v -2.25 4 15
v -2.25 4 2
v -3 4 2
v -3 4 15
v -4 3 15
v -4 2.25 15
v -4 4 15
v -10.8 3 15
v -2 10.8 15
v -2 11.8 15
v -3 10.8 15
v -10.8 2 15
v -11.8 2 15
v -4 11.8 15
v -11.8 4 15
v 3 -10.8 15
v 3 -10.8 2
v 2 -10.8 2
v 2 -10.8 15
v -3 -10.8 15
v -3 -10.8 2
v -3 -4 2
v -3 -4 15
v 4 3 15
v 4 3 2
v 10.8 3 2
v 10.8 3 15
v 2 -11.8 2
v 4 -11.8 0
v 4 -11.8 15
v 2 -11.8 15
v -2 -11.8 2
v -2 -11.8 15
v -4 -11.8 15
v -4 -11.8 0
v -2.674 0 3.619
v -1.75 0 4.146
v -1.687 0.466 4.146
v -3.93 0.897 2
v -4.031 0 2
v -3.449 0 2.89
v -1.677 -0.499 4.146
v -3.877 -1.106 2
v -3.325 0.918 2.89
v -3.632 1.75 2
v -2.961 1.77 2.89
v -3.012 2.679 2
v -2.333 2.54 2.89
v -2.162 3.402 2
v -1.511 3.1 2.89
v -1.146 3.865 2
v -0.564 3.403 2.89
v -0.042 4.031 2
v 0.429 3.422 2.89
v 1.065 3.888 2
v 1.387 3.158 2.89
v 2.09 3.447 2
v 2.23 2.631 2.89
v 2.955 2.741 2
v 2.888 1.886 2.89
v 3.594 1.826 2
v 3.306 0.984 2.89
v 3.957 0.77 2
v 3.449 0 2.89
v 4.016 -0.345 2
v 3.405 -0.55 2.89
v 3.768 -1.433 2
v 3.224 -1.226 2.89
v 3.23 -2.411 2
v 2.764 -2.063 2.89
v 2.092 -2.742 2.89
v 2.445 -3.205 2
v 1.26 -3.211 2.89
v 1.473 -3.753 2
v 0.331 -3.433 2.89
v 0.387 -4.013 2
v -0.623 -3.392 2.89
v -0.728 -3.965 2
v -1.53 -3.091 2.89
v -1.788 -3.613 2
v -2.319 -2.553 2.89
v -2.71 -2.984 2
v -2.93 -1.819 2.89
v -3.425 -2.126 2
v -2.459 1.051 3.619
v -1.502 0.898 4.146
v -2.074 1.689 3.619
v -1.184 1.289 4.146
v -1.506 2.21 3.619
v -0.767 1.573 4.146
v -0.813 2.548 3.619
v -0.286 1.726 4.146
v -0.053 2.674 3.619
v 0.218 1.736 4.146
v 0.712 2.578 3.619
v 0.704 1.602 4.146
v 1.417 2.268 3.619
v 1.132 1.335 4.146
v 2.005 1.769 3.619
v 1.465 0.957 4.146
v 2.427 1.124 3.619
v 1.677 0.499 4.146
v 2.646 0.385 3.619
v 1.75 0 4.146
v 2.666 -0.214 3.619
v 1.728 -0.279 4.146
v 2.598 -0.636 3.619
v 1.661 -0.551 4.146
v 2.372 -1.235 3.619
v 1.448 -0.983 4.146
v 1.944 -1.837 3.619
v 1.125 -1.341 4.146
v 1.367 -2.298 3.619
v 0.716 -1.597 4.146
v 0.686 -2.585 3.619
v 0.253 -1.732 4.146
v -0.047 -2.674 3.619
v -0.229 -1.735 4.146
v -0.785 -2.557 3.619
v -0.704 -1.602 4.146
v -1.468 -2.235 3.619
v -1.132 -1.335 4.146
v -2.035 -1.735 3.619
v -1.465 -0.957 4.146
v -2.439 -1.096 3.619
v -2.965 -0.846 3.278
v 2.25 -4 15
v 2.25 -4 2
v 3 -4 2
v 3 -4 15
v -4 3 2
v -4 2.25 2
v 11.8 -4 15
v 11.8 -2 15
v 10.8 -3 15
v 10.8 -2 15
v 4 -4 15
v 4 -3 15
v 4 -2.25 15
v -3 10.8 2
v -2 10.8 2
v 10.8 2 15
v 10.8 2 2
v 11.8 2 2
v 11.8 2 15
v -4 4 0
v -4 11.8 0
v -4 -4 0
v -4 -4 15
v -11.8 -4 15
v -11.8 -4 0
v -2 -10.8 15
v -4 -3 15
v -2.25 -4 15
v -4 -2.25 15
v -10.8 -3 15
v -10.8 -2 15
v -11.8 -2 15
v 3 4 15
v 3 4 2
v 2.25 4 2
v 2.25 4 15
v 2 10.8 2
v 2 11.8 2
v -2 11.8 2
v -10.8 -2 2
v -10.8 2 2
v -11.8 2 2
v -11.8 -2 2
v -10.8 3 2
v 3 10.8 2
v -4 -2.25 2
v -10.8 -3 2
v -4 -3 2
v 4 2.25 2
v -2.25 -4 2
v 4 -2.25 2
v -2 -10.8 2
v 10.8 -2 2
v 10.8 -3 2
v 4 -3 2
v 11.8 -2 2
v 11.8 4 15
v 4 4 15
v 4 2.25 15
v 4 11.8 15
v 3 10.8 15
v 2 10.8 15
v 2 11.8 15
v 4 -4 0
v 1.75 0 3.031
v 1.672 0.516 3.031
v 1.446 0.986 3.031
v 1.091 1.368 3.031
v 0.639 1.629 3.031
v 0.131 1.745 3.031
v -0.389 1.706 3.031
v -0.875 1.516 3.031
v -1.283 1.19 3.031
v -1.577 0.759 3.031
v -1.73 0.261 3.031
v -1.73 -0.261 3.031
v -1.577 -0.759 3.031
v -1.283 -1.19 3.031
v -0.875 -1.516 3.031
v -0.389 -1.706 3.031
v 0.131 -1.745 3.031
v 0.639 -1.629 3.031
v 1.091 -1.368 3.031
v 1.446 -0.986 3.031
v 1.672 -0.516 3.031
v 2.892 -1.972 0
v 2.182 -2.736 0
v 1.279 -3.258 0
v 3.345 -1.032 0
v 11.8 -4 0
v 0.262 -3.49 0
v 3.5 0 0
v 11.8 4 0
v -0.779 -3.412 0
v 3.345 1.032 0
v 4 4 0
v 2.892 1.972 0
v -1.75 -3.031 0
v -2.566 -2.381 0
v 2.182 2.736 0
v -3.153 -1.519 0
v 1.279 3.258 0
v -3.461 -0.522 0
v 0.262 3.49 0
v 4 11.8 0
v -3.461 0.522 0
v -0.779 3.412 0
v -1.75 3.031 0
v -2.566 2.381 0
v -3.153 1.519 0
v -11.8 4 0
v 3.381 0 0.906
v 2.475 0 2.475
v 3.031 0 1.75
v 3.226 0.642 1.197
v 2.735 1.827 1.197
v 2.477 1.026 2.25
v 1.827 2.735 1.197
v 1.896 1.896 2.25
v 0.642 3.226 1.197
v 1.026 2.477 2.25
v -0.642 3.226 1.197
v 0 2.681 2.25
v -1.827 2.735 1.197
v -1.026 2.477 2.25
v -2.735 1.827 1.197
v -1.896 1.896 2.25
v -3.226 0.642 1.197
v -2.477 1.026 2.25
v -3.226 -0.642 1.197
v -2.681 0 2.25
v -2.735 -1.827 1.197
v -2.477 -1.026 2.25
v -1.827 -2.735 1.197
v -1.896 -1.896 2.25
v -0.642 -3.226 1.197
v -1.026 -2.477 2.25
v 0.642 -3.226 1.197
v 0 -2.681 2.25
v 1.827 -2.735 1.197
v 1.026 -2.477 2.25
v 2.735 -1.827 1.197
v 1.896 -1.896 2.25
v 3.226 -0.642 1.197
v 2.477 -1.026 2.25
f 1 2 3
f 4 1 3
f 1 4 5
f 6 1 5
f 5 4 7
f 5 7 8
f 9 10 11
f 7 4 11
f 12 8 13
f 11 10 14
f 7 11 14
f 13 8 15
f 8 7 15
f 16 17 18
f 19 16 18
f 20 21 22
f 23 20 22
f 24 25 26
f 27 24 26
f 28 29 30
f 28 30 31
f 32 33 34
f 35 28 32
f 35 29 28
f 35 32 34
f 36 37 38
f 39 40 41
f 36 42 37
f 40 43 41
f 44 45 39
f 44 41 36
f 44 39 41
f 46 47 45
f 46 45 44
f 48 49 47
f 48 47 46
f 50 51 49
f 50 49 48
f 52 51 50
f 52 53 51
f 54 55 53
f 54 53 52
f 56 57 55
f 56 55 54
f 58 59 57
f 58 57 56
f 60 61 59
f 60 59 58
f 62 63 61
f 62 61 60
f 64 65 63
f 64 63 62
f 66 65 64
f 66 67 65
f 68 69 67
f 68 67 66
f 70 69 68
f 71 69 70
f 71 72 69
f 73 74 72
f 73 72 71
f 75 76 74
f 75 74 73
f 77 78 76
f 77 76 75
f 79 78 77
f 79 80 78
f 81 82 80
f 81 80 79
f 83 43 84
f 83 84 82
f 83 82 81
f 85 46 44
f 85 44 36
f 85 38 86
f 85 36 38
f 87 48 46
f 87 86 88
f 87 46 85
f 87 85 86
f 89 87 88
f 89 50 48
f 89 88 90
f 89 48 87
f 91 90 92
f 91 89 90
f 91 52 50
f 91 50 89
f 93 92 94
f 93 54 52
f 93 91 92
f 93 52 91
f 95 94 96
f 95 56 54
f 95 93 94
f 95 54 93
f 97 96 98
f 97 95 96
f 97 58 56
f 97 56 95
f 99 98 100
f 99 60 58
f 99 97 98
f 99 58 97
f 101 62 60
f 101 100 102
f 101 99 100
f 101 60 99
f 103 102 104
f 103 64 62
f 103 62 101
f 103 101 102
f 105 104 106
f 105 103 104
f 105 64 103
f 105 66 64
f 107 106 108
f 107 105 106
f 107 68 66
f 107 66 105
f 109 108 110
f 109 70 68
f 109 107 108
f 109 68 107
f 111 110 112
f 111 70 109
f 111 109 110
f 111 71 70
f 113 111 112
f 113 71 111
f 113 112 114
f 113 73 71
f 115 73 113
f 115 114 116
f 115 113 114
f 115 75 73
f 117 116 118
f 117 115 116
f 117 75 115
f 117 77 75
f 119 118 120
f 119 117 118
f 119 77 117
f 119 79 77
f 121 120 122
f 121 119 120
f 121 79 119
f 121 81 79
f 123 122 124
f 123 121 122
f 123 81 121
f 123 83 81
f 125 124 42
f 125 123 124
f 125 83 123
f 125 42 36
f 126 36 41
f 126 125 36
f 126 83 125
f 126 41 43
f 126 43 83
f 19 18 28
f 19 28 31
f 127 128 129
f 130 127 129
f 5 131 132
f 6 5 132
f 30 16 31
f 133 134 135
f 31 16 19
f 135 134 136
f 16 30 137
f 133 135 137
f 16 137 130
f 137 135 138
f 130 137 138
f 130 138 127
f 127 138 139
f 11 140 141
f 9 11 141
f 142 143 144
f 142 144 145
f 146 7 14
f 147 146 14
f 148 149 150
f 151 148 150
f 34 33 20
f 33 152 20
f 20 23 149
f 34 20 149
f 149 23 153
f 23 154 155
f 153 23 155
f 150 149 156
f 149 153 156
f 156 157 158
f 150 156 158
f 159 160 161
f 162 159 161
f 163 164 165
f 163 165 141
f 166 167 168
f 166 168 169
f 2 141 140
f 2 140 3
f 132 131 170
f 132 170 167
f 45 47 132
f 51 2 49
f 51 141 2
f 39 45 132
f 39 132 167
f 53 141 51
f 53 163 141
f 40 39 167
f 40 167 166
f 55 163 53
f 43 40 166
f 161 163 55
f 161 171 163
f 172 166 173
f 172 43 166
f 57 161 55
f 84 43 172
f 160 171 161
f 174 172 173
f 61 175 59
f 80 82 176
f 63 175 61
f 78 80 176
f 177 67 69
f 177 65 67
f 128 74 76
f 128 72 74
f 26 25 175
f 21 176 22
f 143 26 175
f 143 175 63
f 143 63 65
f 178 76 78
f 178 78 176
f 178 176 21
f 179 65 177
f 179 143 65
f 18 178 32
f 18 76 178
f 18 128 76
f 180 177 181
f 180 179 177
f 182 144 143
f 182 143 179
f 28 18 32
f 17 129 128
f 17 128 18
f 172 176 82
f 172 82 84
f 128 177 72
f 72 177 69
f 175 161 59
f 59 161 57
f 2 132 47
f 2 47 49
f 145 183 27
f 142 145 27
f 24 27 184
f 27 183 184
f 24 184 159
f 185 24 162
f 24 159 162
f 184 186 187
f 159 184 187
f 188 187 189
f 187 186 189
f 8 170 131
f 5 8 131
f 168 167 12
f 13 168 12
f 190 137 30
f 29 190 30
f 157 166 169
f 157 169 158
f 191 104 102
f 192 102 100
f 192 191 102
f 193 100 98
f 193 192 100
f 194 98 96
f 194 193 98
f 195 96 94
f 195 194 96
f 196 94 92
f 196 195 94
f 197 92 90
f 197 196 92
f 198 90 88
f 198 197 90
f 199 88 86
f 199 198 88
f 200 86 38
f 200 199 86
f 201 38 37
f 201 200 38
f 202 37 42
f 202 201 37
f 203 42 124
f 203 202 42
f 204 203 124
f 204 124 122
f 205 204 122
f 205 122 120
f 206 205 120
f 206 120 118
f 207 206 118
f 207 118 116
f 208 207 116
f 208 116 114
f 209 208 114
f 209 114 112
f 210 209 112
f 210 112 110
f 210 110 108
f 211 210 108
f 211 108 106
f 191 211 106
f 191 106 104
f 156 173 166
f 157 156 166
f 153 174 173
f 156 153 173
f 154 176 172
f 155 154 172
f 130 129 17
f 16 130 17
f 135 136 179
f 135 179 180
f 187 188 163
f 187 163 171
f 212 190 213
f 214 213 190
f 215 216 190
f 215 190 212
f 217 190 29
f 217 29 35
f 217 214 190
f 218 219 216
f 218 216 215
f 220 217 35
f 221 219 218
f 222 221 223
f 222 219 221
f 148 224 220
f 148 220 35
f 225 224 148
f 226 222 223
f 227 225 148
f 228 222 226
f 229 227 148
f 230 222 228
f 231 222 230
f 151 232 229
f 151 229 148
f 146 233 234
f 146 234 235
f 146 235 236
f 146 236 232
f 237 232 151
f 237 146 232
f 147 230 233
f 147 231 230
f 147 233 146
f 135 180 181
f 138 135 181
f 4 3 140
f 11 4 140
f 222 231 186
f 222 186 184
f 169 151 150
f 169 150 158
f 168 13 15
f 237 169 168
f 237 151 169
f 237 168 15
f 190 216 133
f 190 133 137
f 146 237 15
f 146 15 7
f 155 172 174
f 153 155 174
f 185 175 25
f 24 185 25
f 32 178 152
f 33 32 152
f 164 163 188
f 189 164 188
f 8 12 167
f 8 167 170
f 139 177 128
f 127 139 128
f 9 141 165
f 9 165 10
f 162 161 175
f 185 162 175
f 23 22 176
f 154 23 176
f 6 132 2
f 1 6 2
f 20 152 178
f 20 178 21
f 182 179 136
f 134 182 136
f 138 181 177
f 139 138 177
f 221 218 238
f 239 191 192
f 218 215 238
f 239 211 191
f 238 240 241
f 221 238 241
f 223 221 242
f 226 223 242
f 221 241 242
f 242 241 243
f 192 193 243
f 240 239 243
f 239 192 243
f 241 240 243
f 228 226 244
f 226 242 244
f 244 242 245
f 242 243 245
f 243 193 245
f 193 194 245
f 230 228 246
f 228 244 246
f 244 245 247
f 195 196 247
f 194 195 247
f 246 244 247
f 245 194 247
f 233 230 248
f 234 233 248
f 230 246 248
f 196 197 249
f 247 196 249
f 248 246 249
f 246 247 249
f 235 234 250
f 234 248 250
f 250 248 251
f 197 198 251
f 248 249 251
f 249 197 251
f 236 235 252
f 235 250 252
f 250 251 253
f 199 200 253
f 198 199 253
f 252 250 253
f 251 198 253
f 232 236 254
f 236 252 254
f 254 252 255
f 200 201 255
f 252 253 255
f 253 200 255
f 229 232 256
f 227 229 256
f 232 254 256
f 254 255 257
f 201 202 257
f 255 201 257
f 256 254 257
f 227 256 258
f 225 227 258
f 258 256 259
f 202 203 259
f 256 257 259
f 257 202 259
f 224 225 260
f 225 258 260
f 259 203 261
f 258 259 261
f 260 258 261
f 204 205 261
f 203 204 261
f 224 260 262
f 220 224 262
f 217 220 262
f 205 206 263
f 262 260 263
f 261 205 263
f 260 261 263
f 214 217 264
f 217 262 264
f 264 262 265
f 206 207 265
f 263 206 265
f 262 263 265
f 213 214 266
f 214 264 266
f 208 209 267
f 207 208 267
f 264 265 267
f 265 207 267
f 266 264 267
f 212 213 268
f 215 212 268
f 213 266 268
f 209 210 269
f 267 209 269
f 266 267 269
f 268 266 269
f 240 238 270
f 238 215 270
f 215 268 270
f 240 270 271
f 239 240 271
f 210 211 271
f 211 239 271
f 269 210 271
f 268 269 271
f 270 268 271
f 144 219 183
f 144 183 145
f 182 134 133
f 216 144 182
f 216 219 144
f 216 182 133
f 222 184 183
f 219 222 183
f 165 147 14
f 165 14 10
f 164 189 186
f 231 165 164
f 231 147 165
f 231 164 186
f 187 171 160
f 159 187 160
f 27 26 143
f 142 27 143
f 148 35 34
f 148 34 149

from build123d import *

# Parameters (mm, degrees)
PAD052_DEPTH          = 15
BOX006_W              = 4
BOX006_H              = 15
BOX006_DEPTH          = 12
POLARPATTERN021_COUNT = 4
PAD053_DEPTH          = 2
CYLINDER079_R         = 1.75
CYLINDER079_DEPTH     = 5


with BuildPart() as part:
    # Sketch087 → Pad052 (new body)
    with BuildSketch(Plane.XY):
        Polygon((-11.8, 4), (-4, 4), (-4, 11.8), (4, 11.8), (4, 4), (11.8, 4), (11.8, -4), (4, -4), (4, -11.8), (-4, -11.8), (-4, -4), (-11.8, -4), align=None)
        Polygon((-3, 10.8), (3, 10.8), (3, 4), (2.25, 4), (4, 2.25), (4, 3), (10.8, 3), (10.8, -3), (4, -3), (4, -2.25), (2.25, -4), (3, -4), (3, -10.8), (-3, -10.8), (-3, -4), (-2.25, -4), (-4, -2.25), (-4, -3), (-10.8, -3), (-10.8, 3), (-4, 3), (-4, 2.25), (-2.25, 4), (-3, 4), align=None, mode=Mode.SUBTRACT)
    extrude(amount=PAD052_DEPTH)

    # Box006 → Box006 (cut)
    with BuildSketch(Plane(origin=(-2, 0, 2), x_dir=(1, 0, 0), z_dir=(0, -1, 0))):
        with Locations((2, 7.5)):
            Rectangle(BOX006_W, BOX006_H)
    box006 = extrude(amount=BOX006_DEPTH, mode=Mode.SUBTRACT)

    # PolarPattern021: Box006 ×4 about axis
    polarpattern021_axis = Axis((0, 0, 0), (0, 0, 1))
    for i in range(1, POLARPATTERN021_COUNT):
        add(box006.rotate(polarpattern021_axis, i * 360 / POLARPATTERN021_COUNT), mode=Mode.SUBTRACT)

    # Sketch088 → Pad053 (join)
    with BuildSketch(Plane.XY):
        Polygon((-4, 11.8), (-4, 4), (-11.8, 4), (-11.8, -4), (-4, -4), (-4, -11.8), (4, -11.8), (4, -4), (11.8, -4), (11.8, 4), (4, 4), (4, 11.8), align=None)
    extrude(amount=PAD053_DEPTH)

    # Sphere003 → Sphere003 (revolve)
    with BuildSketch(Plane(origin=(0, 0, 0), x_dir=(-1, 0, 0), z_dir=(0, -1, 0))):
        with BuildLine():
            ThreePointArc((0, -4.5), (3.181981, -3.181981), (4.5, 0))
            Line((4.5, 0), (0, 0))
            Line((0, 0), (0, -4.5))
        make_face()
    revolve(axis=Axis((0, 0, 0), (0, 0, -1)))

    # Cylinder079 → Cylinder079 (cut)
    with BuildSketch(Plane.XY):
        Circle(CYLINDER079_R)
    extrude(amount=CYLINDER079_DEPTH, mode=Mode.SUBTRACT)

    # Sphere002 → Sphere002 (revolve, cut)
    with BuildSketch(Plane.XZ):
        with BuildLine():
            ThreePointArc((0, -3.5), (3.5, 0), (0, 3.5))
            Line((0, 3.5), (0, -3.5))
        make_face()
    revolve(axis=Axis((0, 0, 0), (0, 0, 1)), mode=Mode.SUBTRACT)


solid = part.part
